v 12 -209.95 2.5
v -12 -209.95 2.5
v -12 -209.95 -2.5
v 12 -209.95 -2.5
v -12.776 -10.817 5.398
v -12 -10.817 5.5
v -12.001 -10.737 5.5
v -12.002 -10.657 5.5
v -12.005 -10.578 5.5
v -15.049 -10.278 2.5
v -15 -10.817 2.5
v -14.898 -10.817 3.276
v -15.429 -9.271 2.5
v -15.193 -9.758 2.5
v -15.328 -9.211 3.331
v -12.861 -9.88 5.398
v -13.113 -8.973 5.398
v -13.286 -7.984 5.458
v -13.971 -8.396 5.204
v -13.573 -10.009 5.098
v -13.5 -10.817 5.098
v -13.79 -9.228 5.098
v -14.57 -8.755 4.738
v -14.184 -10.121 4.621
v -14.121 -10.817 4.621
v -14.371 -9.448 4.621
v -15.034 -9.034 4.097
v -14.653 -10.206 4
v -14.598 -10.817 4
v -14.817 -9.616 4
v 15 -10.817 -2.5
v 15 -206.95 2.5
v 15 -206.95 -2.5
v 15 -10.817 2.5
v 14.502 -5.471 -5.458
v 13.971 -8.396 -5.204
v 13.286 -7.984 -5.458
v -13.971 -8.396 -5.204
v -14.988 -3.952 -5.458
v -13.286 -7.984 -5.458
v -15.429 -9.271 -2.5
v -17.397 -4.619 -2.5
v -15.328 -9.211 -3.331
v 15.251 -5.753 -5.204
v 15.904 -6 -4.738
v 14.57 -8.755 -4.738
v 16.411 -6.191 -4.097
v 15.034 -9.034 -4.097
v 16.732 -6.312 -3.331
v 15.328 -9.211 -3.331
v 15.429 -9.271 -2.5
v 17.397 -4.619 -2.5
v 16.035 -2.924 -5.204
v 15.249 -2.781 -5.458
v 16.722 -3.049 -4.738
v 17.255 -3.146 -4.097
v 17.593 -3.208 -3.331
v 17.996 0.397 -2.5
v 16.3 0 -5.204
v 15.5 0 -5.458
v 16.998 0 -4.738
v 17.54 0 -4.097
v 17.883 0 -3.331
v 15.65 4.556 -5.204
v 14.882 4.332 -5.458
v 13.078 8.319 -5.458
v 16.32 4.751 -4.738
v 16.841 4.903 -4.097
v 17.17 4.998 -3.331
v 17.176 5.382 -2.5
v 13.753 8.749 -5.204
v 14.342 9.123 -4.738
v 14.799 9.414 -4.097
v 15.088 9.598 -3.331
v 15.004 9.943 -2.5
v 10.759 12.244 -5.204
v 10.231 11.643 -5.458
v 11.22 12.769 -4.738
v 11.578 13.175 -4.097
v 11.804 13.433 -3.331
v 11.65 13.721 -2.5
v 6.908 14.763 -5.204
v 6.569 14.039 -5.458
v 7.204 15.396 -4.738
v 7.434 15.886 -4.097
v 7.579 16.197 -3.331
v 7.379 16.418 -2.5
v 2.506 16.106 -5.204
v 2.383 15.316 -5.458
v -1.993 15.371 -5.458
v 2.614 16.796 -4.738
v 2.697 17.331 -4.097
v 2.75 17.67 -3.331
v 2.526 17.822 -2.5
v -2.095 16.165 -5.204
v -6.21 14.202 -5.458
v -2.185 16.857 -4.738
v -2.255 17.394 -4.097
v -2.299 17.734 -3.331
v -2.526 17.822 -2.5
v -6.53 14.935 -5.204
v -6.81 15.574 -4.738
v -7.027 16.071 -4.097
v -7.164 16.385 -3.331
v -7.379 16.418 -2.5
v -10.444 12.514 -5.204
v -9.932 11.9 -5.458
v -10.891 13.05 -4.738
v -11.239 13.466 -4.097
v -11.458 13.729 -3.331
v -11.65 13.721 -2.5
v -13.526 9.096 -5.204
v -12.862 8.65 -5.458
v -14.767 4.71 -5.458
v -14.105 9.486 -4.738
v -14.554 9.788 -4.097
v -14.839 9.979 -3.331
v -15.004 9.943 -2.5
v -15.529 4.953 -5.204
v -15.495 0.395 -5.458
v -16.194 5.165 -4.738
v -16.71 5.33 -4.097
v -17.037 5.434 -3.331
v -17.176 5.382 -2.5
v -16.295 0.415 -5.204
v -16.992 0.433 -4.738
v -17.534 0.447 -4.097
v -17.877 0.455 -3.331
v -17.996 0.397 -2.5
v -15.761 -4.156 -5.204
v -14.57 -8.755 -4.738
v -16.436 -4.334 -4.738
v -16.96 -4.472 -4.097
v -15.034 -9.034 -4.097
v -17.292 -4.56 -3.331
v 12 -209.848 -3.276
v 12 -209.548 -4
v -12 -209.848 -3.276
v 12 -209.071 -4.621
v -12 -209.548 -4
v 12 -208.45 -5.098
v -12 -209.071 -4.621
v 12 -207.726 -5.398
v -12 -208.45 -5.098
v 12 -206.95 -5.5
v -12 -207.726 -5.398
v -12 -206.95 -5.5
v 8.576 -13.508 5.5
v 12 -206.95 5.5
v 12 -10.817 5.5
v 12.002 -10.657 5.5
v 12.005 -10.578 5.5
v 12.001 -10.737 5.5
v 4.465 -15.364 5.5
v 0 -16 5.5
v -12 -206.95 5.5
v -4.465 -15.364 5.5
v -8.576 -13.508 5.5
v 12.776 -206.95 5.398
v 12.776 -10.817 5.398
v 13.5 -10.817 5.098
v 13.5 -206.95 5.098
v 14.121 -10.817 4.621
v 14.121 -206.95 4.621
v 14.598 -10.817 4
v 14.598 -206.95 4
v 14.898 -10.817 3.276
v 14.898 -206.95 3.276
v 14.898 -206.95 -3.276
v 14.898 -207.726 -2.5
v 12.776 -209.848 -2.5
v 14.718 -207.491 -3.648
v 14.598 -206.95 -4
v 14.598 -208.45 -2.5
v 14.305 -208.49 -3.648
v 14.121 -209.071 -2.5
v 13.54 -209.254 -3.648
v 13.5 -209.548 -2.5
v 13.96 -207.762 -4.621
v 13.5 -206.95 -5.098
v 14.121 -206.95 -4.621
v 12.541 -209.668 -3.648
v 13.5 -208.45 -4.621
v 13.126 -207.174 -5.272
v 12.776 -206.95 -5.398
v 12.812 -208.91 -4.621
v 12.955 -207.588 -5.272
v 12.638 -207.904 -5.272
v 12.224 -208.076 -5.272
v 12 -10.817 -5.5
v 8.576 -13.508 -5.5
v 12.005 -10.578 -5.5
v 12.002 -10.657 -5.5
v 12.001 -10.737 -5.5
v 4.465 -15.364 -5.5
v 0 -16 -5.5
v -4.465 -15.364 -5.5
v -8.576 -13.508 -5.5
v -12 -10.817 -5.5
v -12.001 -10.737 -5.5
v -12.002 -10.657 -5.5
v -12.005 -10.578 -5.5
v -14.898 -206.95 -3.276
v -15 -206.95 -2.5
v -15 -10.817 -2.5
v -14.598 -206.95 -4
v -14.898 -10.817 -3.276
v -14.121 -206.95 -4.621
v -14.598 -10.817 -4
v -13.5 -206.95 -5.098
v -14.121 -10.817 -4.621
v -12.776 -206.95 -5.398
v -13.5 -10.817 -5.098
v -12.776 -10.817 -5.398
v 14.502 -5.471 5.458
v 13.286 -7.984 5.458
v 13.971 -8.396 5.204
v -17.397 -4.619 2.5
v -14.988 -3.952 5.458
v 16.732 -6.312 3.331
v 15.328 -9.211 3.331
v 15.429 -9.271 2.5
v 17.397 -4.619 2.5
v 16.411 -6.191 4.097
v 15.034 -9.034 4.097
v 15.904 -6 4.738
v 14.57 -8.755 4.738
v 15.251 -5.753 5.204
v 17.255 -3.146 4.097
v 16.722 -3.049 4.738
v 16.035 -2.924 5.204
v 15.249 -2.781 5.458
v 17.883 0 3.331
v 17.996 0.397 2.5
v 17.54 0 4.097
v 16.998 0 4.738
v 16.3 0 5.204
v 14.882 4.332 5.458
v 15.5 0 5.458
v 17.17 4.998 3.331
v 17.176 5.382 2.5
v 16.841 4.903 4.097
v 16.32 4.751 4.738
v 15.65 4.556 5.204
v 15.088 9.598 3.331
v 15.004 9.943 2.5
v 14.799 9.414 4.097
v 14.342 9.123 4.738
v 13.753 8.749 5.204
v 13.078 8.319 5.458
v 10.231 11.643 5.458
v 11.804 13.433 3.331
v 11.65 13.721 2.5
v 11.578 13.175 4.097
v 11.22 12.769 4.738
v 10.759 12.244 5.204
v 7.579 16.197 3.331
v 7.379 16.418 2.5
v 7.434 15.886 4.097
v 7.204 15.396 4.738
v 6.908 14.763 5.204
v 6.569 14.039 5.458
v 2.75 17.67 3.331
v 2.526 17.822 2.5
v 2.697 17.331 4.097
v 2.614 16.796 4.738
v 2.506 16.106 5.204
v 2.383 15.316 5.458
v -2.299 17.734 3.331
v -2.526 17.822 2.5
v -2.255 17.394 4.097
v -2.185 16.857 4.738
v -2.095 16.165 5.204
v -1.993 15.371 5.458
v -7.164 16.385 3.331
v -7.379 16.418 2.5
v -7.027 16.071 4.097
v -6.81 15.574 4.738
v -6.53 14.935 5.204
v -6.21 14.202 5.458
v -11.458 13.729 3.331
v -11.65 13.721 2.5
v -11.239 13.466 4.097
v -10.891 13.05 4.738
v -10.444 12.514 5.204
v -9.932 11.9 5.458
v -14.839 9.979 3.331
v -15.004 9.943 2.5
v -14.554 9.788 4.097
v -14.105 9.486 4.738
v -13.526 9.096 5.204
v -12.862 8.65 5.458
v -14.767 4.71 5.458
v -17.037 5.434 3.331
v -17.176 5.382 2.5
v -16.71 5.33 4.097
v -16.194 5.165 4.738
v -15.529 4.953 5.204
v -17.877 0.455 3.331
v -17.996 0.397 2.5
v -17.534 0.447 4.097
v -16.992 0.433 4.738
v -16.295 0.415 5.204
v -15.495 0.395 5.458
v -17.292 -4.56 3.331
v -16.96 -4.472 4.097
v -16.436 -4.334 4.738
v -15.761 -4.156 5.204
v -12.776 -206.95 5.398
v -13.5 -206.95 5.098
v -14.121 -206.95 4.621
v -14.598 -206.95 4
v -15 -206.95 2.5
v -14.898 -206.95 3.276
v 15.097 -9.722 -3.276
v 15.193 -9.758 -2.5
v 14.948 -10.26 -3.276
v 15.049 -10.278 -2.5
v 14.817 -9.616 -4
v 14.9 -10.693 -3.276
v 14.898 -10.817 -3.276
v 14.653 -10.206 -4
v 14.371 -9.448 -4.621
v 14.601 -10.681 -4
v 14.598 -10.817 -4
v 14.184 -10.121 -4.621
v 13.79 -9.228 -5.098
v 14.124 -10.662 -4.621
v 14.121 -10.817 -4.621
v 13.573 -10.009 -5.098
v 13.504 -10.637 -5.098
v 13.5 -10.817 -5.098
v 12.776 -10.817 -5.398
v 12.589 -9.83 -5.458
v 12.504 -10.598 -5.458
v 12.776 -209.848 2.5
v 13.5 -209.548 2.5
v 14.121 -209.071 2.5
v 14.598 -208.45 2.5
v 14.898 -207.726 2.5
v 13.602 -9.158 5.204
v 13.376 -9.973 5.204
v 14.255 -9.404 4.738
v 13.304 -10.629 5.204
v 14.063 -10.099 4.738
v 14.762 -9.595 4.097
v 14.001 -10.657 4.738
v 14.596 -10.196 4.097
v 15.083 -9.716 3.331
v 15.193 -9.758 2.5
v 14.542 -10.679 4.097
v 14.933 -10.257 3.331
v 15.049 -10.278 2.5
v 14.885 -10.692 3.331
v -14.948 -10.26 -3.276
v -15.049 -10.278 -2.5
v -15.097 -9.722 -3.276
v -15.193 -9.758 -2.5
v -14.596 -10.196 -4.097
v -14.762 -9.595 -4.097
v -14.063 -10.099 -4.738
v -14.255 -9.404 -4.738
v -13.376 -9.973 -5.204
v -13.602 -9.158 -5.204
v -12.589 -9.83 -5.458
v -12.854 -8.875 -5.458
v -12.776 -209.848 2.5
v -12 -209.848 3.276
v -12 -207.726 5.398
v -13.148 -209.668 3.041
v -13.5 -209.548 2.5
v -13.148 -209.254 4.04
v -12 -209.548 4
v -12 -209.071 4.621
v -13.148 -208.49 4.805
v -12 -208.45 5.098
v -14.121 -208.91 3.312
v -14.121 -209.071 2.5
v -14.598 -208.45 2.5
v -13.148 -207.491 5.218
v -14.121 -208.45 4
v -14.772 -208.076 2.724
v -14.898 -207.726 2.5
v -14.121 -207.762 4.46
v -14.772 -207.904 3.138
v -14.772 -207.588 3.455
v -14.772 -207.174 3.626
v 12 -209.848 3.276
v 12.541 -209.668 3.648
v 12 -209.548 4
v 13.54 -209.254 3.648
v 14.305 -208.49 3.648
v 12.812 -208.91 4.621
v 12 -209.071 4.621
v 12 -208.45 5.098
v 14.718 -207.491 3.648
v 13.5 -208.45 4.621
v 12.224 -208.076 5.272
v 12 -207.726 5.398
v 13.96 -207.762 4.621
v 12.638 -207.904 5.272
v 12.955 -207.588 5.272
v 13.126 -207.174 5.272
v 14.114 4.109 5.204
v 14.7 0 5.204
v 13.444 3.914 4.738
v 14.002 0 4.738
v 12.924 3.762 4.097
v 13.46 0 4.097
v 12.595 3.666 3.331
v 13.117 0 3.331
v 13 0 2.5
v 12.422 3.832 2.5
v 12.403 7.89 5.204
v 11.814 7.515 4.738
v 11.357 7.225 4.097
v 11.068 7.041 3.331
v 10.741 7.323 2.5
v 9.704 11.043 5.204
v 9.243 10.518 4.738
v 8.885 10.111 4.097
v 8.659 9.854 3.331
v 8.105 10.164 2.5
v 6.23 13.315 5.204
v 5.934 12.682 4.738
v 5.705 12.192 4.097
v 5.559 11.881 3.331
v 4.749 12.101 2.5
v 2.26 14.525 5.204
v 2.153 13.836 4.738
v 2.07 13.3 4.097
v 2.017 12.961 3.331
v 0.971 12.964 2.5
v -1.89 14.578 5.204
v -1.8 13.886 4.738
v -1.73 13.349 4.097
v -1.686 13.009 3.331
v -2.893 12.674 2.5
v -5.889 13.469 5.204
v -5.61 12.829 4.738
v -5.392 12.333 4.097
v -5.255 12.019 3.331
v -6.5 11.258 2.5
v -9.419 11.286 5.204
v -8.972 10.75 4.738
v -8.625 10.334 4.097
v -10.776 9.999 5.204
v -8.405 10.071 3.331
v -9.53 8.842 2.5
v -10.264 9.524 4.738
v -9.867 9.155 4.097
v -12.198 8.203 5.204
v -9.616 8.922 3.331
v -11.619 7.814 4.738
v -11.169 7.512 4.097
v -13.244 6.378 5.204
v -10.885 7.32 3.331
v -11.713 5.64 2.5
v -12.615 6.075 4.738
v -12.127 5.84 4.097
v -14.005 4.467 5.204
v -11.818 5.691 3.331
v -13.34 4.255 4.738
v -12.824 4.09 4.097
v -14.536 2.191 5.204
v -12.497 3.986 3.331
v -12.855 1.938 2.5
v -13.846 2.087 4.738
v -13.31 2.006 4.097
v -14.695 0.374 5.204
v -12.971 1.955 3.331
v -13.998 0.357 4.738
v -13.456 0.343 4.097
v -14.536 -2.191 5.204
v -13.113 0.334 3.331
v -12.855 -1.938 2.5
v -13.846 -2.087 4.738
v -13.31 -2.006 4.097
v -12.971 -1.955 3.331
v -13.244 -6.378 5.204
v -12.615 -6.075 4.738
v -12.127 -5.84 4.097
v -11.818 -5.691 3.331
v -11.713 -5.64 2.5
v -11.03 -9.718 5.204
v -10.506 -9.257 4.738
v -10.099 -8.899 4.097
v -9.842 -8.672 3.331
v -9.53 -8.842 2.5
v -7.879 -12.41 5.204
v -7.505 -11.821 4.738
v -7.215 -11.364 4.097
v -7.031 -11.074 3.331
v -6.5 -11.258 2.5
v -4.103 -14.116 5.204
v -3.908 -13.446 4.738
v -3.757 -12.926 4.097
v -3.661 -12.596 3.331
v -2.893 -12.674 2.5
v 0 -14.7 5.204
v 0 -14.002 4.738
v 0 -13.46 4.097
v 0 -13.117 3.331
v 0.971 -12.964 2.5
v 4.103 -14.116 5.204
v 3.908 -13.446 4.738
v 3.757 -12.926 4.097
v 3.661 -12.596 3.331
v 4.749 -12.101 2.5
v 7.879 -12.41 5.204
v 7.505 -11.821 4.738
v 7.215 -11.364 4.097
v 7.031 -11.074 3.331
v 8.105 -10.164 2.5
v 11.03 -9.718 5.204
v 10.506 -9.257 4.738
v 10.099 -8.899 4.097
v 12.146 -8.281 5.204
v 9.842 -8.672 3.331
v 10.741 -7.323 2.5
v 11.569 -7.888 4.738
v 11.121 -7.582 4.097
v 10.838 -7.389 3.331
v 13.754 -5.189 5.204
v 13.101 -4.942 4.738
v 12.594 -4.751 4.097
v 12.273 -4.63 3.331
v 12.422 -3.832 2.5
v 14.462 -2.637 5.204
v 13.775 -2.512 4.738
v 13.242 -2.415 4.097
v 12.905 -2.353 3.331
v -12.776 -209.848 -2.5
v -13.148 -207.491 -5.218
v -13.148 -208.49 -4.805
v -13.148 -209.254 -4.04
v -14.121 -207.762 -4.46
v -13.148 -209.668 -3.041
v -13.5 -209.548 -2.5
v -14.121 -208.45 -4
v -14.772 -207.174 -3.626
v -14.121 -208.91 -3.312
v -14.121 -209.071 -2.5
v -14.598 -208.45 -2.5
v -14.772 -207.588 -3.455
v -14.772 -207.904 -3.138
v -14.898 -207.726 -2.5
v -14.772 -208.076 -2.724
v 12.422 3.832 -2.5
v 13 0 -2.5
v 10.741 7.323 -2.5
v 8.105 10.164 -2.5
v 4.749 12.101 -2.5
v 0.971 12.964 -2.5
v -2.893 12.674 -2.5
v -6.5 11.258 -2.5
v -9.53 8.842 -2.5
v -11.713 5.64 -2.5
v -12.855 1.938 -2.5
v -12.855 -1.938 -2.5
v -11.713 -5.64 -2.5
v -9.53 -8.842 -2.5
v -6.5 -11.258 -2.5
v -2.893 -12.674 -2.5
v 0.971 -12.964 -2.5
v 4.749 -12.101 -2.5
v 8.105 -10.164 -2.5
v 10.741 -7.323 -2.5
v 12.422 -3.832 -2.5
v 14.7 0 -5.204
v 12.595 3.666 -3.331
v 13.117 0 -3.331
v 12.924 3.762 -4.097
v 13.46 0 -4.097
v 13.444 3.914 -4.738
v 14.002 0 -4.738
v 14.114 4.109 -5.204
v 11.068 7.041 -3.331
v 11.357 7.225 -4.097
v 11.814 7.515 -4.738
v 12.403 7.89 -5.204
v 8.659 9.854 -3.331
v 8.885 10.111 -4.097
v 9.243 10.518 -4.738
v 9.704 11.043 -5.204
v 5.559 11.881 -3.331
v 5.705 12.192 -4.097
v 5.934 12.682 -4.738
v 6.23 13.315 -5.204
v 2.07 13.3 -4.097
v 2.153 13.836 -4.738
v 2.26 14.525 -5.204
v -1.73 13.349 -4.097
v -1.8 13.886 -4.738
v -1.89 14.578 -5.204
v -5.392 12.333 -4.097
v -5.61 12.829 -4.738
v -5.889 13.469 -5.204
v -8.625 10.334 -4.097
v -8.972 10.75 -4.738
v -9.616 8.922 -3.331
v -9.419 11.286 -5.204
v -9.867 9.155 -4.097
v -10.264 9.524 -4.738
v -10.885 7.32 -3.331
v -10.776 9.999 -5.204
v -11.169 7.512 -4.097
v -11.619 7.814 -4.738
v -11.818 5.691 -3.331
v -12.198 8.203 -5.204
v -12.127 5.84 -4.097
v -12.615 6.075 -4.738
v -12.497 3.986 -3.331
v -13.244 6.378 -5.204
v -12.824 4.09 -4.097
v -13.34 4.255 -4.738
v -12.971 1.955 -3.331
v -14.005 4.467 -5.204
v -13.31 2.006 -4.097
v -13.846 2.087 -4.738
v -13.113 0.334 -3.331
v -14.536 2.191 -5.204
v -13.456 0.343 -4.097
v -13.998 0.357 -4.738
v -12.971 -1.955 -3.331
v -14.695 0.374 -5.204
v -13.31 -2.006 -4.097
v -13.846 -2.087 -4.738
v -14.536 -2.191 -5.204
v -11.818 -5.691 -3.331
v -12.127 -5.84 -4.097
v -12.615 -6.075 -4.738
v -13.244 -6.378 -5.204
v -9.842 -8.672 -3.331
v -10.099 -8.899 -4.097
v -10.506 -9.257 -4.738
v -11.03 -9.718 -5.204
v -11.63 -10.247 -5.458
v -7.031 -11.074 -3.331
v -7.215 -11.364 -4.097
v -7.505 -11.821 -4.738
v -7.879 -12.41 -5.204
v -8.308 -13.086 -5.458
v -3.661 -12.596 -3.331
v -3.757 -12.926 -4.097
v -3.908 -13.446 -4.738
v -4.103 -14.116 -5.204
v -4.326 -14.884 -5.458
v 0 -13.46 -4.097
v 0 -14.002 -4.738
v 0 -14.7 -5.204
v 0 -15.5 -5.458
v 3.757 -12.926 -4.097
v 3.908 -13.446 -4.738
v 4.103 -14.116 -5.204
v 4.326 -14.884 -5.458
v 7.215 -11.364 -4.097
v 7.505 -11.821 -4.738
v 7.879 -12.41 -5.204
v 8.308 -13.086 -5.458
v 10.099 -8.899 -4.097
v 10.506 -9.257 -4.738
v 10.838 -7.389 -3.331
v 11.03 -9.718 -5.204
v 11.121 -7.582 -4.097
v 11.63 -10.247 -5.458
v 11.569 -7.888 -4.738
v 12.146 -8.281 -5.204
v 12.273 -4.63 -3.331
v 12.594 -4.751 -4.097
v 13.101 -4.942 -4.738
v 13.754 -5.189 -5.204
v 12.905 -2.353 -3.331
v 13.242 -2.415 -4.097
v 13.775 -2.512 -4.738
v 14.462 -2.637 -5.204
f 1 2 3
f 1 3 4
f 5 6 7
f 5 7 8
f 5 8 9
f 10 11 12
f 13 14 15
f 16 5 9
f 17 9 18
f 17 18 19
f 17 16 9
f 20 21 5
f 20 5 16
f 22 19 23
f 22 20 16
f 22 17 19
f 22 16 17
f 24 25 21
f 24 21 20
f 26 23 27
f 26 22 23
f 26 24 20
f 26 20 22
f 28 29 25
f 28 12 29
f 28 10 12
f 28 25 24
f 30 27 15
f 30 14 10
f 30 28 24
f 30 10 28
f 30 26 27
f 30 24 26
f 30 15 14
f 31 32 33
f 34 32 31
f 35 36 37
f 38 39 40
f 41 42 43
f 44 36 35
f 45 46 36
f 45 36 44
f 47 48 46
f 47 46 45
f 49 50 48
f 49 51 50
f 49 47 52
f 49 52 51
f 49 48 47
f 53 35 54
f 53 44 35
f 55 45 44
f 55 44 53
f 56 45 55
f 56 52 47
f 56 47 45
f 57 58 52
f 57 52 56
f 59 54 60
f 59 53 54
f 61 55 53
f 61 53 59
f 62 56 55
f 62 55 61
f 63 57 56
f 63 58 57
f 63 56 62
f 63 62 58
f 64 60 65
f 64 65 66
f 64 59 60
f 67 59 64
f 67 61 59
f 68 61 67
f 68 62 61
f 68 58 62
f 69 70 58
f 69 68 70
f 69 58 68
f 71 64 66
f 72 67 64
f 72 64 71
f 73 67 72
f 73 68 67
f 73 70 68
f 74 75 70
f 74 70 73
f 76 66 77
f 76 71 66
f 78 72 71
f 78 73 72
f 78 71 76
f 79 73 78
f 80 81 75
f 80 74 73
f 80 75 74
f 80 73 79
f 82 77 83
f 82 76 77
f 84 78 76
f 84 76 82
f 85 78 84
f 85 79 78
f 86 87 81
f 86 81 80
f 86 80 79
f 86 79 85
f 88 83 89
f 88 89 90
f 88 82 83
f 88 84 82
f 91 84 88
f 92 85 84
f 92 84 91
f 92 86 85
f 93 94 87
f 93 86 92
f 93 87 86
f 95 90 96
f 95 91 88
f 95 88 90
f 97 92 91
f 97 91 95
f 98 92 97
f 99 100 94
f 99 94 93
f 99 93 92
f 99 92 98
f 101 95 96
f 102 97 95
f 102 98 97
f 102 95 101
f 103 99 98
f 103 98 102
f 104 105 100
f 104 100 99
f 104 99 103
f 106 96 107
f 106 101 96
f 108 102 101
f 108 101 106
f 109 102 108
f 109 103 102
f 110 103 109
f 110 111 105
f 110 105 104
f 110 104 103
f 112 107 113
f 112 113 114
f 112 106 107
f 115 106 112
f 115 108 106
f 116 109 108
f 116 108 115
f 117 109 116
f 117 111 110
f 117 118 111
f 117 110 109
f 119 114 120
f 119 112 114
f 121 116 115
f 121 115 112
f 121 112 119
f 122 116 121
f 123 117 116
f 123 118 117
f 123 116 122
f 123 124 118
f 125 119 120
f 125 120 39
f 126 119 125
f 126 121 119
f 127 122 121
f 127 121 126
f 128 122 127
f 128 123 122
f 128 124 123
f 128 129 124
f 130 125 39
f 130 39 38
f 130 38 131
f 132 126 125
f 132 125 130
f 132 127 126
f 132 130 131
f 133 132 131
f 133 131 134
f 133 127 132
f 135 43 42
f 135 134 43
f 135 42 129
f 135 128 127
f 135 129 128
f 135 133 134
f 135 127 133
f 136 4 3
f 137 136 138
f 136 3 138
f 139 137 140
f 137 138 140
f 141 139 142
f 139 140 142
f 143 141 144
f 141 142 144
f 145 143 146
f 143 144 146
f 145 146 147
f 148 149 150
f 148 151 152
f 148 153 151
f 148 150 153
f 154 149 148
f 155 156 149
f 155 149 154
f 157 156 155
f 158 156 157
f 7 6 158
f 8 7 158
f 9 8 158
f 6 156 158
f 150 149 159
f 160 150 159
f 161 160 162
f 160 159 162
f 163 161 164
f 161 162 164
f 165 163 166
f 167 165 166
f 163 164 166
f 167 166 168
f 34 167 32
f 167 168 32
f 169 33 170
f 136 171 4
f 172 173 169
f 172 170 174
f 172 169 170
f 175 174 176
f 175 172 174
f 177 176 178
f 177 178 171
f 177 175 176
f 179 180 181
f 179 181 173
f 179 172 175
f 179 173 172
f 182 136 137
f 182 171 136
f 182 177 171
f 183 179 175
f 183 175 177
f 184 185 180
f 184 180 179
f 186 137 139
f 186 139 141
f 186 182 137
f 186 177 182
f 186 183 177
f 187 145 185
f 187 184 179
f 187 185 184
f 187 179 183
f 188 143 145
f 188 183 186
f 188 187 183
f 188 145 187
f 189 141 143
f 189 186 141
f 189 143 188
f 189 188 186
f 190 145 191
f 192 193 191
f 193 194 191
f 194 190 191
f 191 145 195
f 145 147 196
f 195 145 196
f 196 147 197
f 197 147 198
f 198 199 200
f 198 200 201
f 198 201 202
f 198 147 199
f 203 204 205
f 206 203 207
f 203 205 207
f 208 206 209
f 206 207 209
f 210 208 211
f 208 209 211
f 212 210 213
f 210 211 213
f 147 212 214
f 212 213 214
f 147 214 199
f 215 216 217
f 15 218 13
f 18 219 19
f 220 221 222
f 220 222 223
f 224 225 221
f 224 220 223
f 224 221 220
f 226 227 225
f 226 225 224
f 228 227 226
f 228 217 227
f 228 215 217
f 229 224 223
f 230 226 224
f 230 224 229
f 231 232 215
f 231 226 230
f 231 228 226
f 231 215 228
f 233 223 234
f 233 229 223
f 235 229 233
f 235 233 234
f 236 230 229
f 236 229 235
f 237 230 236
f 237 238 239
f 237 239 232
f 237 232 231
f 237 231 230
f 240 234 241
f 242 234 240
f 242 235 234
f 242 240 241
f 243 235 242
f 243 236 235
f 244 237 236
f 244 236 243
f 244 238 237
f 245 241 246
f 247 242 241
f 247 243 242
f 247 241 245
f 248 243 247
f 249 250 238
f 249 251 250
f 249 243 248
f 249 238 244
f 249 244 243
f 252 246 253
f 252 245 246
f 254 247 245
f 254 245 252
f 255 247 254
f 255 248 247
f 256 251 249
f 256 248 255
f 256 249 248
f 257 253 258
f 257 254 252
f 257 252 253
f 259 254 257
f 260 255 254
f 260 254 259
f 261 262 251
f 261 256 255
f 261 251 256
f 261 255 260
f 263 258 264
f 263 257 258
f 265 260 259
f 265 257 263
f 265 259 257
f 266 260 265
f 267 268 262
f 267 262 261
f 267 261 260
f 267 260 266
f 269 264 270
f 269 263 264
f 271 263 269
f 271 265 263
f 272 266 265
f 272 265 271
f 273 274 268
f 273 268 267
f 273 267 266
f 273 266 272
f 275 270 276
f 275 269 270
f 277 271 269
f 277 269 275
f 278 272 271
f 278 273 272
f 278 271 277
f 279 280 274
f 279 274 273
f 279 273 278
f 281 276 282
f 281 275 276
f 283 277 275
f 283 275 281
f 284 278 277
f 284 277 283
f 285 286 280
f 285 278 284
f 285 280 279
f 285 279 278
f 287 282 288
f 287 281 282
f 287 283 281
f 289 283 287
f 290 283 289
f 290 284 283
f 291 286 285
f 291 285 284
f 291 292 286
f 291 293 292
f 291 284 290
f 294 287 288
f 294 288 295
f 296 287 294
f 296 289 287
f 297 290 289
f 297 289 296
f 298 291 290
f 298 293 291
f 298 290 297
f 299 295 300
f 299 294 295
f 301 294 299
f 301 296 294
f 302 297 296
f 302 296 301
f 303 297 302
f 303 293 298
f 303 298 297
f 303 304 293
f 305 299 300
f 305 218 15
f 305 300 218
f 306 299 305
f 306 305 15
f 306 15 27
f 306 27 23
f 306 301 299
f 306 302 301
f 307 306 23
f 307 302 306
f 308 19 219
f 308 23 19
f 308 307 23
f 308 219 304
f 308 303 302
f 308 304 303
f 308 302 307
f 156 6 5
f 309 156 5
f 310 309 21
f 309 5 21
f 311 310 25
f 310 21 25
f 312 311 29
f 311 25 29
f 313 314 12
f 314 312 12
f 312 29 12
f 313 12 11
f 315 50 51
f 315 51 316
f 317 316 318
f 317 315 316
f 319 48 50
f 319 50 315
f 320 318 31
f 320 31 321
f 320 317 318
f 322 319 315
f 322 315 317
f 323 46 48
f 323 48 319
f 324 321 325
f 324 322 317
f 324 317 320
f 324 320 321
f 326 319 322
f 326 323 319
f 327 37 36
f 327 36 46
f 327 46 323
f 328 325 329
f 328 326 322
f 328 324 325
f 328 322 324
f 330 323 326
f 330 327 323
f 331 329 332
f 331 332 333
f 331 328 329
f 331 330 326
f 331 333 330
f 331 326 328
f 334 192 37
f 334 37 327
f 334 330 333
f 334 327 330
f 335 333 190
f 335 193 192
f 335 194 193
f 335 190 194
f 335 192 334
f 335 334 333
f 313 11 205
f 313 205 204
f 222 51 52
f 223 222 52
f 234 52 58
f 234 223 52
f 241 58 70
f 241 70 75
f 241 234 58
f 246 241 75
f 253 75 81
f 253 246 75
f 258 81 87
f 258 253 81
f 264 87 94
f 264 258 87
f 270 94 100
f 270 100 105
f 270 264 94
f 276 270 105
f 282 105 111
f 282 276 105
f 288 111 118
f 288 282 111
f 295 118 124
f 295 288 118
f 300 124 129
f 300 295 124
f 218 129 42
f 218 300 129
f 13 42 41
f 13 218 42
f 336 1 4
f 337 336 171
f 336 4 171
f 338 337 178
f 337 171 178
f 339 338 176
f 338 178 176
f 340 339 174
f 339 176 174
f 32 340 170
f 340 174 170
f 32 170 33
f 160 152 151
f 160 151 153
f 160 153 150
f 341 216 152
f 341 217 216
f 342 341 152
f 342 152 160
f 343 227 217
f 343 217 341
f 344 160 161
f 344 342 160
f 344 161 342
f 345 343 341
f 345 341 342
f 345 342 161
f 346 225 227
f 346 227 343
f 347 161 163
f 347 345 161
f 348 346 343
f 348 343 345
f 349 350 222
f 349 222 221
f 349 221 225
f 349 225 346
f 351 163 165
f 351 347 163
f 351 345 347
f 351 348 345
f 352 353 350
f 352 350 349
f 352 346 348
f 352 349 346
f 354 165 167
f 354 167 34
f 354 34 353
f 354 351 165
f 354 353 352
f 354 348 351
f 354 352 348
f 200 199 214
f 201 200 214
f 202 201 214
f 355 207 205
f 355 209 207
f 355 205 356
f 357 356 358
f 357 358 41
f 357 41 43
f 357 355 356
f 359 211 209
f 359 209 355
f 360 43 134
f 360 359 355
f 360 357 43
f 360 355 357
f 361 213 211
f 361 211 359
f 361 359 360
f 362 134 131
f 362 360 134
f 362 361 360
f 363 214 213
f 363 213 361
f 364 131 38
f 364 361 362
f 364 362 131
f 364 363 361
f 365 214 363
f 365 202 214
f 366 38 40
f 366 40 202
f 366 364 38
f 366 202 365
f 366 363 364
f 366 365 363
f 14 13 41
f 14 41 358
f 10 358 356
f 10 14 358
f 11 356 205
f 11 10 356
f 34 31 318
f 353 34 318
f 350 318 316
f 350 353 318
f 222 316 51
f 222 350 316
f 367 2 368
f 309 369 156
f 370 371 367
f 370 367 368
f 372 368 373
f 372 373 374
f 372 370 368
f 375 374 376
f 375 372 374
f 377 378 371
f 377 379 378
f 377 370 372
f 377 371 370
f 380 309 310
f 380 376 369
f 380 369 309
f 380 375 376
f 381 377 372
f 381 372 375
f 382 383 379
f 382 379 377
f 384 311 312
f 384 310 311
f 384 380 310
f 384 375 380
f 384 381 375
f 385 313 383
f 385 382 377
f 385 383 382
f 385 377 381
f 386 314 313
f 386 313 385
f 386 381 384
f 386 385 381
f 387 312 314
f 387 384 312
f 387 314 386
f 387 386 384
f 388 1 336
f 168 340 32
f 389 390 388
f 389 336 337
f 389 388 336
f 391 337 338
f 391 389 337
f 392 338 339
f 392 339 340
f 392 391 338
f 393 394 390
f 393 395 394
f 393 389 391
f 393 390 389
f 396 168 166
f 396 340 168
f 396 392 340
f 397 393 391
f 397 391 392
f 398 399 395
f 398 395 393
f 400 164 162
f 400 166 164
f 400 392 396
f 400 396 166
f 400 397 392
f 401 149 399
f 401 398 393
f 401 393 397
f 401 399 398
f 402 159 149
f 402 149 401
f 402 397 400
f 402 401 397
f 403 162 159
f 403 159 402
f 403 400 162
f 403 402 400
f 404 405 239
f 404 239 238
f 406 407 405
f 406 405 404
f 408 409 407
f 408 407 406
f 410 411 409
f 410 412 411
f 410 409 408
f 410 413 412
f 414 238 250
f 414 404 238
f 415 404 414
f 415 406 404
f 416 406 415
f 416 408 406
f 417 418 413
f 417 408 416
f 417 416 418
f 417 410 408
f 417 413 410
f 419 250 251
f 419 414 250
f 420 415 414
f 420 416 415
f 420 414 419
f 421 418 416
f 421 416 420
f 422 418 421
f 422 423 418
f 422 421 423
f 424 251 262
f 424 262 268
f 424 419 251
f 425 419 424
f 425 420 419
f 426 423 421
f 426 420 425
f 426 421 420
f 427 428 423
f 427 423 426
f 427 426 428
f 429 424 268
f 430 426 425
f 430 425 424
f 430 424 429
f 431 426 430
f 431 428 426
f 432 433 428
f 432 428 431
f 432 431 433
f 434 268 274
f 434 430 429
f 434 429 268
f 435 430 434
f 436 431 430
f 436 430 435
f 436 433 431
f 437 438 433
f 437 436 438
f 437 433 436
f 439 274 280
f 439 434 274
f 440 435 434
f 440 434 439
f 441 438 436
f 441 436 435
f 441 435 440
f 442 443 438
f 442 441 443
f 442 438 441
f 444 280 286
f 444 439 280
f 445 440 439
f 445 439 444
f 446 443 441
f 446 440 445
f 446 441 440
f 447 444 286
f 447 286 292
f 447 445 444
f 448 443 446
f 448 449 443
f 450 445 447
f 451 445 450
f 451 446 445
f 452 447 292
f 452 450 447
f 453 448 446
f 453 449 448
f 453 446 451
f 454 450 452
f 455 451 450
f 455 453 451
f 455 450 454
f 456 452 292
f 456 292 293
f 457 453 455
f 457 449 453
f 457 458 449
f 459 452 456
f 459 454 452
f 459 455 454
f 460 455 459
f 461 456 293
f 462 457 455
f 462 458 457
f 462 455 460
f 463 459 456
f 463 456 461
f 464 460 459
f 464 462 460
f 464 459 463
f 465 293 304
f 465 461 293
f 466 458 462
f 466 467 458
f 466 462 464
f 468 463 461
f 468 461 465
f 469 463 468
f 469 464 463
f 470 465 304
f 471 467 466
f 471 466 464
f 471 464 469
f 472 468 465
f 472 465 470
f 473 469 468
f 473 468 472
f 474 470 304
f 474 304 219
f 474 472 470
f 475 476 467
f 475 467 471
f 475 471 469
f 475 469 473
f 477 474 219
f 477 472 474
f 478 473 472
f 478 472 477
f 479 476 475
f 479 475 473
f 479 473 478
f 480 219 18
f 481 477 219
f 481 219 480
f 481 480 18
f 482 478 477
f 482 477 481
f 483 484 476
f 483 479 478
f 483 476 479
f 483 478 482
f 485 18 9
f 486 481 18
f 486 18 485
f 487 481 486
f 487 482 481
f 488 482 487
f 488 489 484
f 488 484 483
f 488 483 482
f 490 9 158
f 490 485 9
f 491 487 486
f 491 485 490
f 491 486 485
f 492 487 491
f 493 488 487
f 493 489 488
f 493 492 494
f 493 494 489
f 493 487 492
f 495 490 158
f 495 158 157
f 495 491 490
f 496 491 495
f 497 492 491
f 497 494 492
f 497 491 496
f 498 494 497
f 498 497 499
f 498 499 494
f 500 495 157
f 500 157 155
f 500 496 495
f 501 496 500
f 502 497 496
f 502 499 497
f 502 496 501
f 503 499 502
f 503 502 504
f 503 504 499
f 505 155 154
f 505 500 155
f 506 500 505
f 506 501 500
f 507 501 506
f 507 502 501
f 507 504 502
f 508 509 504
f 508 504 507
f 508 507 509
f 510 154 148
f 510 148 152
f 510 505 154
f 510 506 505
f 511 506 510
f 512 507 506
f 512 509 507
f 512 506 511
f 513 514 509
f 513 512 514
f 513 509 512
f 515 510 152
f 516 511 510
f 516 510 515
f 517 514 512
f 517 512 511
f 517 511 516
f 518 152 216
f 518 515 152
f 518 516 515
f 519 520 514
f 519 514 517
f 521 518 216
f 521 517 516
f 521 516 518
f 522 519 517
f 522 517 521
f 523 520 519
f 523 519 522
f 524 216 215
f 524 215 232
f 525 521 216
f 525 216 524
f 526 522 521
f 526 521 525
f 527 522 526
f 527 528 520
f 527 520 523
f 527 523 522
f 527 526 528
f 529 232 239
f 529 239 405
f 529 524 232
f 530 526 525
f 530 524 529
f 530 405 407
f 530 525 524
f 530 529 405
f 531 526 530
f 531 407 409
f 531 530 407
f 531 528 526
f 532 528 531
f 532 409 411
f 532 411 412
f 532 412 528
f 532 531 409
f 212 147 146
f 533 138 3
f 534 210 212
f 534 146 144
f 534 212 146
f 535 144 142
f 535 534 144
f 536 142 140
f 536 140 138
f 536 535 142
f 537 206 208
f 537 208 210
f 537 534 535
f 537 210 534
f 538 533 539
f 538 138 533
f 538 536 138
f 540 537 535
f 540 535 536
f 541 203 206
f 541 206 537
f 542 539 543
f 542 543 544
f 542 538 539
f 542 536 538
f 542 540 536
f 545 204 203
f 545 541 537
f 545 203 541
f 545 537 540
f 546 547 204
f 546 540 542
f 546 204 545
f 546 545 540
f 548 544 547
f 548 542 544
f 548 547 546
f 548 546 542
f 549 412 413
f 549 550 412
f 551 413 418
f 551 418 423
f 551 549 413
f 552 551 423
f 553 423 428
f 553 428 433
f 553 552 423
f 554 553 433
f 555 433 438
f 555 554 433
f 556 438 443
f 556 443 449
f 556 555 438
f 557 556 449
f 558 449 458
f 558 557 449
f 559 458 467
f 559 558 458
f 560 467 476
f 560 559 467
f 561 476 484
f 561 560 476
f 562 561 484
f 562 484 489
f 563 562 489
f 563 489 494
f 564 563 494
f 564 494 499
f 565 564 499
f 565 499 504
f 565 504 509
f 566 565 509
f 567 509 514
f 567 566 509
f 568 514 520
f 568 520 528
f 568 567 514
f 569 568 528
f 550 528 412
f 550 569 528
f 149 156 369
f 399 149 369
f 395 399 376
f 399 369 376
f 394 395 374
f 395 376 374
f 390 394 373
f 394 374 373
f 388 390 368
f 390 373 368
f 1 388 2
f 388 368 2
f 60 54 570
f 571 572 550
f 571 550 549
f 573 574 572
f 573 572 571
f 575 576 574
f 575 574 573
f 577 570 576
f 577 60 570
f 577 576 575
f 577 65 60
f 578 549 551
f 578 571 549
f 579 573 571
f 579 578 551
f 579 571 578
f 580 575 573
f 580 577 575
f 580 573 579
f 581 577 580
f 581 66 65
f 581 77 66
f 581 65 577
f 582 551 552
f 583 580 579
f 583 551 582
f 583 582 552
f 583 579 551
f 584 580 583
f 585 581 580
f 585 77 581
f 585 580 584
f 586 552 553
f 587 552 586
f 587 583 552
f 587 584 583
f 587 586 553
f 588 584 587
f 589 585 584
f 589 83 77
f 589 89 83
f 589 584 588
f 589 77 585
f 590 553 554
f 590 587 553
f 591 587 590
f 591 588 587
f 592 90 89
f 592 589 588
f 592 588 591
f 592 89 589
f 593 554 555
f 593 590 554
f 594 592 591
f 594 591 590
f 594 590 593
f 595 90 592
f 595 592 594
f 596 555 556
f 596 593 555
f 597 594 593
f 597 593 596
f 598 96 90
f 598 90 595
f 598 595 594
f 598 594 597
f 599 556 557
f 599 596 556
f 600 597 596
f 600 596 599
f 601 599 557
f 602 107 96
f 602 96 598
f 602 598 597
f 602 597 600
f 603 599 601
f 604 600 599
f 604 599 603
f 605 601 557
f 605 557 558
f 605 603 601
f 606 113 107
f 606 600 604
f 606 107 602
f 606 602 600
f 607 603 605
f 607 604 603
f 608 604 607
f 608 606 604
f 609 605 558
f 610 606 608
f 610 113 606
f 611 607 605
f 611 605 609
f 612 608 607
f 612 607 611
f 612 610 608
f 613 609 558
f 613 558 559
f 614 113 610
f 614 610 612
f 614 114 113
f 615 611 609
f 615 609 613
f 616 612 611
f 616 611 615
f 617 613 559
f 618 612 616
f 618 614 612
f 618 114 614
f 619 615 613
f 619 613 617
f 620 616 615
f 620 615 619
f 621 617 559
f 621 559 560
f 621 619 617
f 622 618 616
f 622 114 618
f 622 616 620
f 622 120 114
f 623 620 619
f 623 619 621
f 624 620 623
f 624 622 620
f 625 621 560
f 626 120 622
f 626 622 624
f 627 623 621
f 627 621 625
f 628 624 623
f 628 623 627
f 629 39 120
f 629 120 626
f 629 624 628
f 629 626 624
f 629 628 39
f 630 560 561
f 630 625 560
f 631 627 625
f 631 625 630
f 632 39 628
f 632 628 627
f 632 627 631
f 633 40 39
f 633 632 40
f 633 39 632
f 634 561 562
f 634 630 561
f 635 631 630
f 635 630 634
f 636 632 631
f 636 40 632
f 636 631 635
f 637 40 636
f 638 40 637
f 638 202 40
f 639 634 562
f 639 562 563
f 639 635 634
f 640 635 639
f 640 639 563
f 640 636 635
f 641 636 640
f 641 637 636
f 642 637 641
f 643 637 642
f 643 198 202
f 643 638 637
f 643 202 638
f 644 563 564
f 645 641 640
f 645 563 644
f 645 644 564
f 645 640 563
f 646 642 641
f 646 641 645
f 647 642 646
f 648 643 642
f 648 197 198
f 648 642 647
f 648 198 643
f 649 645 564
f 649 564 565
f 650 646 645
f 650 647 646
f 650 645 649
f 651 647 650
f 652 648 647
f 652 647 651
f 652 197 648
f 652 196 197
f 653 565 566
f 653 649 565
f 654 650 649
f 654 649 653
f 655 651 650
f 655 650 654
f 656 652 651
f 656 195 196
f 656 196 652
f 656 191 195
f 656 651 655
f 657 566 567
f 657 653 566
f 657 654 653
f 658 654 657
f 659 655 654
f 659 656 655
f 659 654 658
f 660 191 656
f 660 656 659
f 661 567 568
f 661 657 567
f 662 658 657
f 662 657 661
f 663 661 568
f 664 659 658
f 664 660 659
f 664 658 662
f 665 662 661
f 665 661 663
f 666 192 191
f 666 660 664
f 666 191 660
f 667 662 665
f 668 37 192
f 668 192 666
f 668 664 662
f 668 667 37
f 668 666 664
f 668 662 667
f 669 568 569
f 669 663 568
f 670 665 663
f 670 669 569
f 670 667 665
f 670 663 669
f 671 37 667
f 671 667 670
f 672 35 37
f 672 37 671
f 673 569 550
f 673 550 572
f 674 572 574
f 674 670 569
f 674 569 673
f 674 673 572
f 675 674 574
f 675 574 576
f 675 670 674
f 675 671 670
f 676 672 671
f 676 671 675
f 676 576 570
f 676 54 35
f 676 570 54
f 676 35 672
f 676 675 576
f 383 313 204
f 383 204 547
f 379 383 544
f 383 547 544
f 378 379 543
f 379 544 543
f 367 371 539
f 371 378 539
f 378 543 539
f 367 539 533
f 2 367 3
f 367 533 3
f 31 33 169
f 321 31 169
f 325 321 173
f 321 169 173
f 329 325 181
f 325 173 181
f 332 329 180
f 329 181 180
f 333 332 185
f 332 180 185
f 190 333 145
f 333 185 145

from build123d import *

# Parameters (mm, degrees)
SKETCH1_R           = 13
BOSS_EXTRUDE1_DEPTH = 5.5
FILLET2_R           = 3


with BuildPart() as part:
    # Sketch1 → Boss-Extrude1 (new, symmetric)
    with BuildSketch(Plane.XY):
        with BuildLine():
            Line((-15, -9.949874371), (-15, -209.949874371))
            Line((-15, -209.949874371), (15, -209.949874371))
            Line((15, -209.949874371), (15, -9.949874371))
            ThreePointArc((15, -9.949874371), (0, 18), (-15, -9.949874371))
        make_face()
        Circle(SKETCH1_R, mode=Mode.SUBTRACT)
    extrude(amount=BOSS_EXTRUDE1_DEPTH, both=True)

    # Fillet2
    # the kernel refuses this fillet: 3 mm, written as the material it adds along each edge
    with BuildSketch(Plane(origin=(15, -9.949874371, 5.5), x_dir=(0.5340574779916704, 0.8454481712093158, 0), z_dir=(0, 0, -1))) as fillet2_piece_1:
        with BuildLine():
            CenterArc((0.869355329, 2.999254564), FILLET2_R, 237.719985552, 31.002719134)
            Line((-0.732817105, 0.46291005), (0, 0))
            ThreePointArc((0, 0), (0.401240921, 0.004472619), (0.802481842, 0))
        make_face()
    extrude(amount=11)
    with BuildSketch(Plane(origin=(-15, -9.949874371, 5.5), x_dir=(0, -1, 0), z_dir=(0, 0, -1))) as fillet2_piece_2:
        with BuildLine():
            CenterArc((0.866779455, 3), FILLET2_R, 238.997280866, 31.002719134)
            ThreePointArc((-0.678456806, 0.428571429), (-0.336839767, 0.218067082), (0, 0))
            Line((0, 0), (0.866779455, 0))
        make_face()
    extrude(amount=11)
    # the kernel refuses this fillet: 3 mm, written as the material it takes off along each edge
    with BuildSketch(Plane(origin=(0, 0, -5.5), x_dir=(1, 0, 0), z_dir=(0, -1, 0))) as fillet2_2_piece_1:
        with BuildLine():
            CenterArc((13 + FILLET2_R, FILLET2_R), FILLET2_R, 180, 90)
            Line((13, FILLET2_R), (13, 0))
            Line((13, 0), (13 + FILLET2_R, 0))
        make_face()
    revolve(axis=Axis((0, 0, -5.5), (0, 0, 1)), mode=Mode.SUBTRACT)
    with BuildSketch(Plane(origin=(0, 0, 5.5), x_dir=(1, 0, 0), z_dir=(0, -1, 0))) as fillet2_2_piece_2:
        with BuildLine():
            CenterArc((13 + FILLET2_R, -FILLET2_R), FILLET2_R, 90, 90)
            Line((13, -FILLET2_R), (13, 0))
            Line((13, 0), (13 + FILLET2_R, 0))
        make_face()
    revolve(axis=Axis((0, 0, 5.5), (0, 0, 1)), mode=Mode.SUBTRACT)
    with BuildSketch(Plane(origin=(-22.5, -209.949874371, 5.5), x_dir=(0, 1, 0), z_dir=(1, 0, 0)), Plane(origin=(-22.5, -209.949874371, -5.5), x_dir=(0, 0, 1), z_dir=(1, 0, 0))) as fillet2_2_piece_3:
        with BuildLine():
            CenterArc((FILLET2_R, -FILLET2_R), FILLET2_R, 90, 90)
            Line((0, -FILLET2_R), (0, 0))
            Line((0, 0), (FILLET2_R, 0))
        make_face()
    extrude(amount=45, mode=Mode.SUBTRACT)
    with BuildSketch(Plane(origin=(15, -209.949874371, -13), x_dir=(-1, 0, 0), z_dir=(0, 0, 1)), Plane(origin=(-15, -209.949874371, -13), x_dir=(0, 1, 0), z_dir=(0, 0, 1))) as fillet2_2_piece_4:
        with BuildLine():
            CenterArc((FILLET2_R, -FILLET2_R), FILLET2_R, 90, 90)
            Line((0, -FILLET2_R), (0, 0))
            Line((0, 0), (FILLET2_R, 0))
        make_face()
    extrude(amount=26, mode=Mode.SUBTRACT)
    # the kernel refuses this fillet: 3 mm, written as the material it takes off along each edge
    with BuildSketch(Plane(origin=(-12, -206.949874371, 2.5), x_dir=(0, 0, 1), z_dir=(-1, 0, 0))) as fillet2_3_piece_1_section:
        Polygon((0, 0), (FILLET2_R, 0), (FILLET2_R, -FILLET2_R), (0, -FILLET2_R), align=None)
    fillet2_3_piece_1 = extrude(amount=FILLET2_R, mode=Mode.PRIVATE)
    fillet2_3_piece_1 = fillet2_3_piece_1 - Plane(origin=(-12, -206.949874371, 2.5), x_dir=(0, 0.7071067811865475, -0.7071067811865475), z_dir=(-1, 0, 0)) * Sphere(FILLET2_R, mode=Mode.PRIVATE)
    add(fillet2_3_piece_1, mode=Mode.SUBTRACT)
    with BuildSketch(Plane(origin=(-12, -206.949874371, -2.5), x_dir=(0, 0, -1), z_dir=(-1, 0, 0))) as fillet2_3_piece_2_section:
        Polygon((0, 0), (FILLET2_R, 0), (FILLET2_R, FILLET2_R), (0, FILLET2_R), align=None)
    fillet2_3_piece_2 = extrude(amount=FILLET2_R, mode=Mode.PRIVATE)
    fillet2_3_piece_2 = fillet2_3_piece_2 - Plane(origin=(-12, -206.949874371, -2.5), x_dir=(0, 0.7071067811865475, 0.7071067811865475), z_dir=(-1, 0, 0)) * Sphere(FILLET2_R, mode=Mode.PRIVATE)
    add(fillet2_3_piece_2, mode=Mode.SUBTRACT)
    with BuildSketch(Plane(origin=(12, -206.949874371, -2.5), x_dir=(1, 0, 0), z_dir=(0, 0, -1))) as fillet2_3_piece_3_section:
        Polygon((0, 0), (FILLET2_R, 0), (FILLET2_R, FILLET2_R), (0, FILLET2_R), align=None)
    fillet2_3_piece_3 = extrude(amount=FILLET2_R, mode=Mode.PRIVATE)
    fillet2_3_piece_3 = fillet2_3_piece_3 - Plane(origin=(12, -206.949874371, -2.5), x_dir=(-0.7071067811865475, 0.7071067811865475, 0), z_dir=(0, 0, -1)) * Sphere(FILLET2_R, mode=Mode.PRIVATE)
    add(fillet2_3_piece_3, mode=Mode.SUBTRACT)
    with BuildSketch(Plane(origin=(12, -206.949874371, 2.5), x_dir=(1, 0, 0), z_dir=(0, 0, 1))) as fillet2_3_piece_4_section:
        Polygon((0, 0), (FILLET2_R, 0), (FILLET2_R, -FILLET2_R), (0, -FILLET2_R), align=None)
    fillet2_3_piece_4 = extrude(amount=FILLET2_R, mode=Mode.PRIVATE)
    fillet2_3_piece_4 = fillet2_3_piece_4 - Plane(origin=(12, -206.949874371, 2.5), x_dir=(-0.7071067811865475, 0.7071067811865475, 0), z_dir=(0, 0, 1)) * Sphere(FILLET2_R, mode=Mode.PRIVATE)
    add(fillet2_3_piece_4, mode=Mode.SUBTRACT)
    with BuildSketch(Plane(origin=(15, -206.949874371, 5.5), x_dir=(-1, 0, 0), z_dir=(0, 1, 0)), Plane(origin=(-15, -10.816653826, -5.5), x_dir=(0, 0, 1), z_dir=(0, -1, 0))) as fillet2_3_piece_5:
        with BuildLine():
            CenterArc((FILLET2_R, -FILLET2_R), FILLET2_R, 90, 90)
            Line((0, -FILLET2_R), (0, 0))
            Line((0, 0), (FILLET2_R, 0))
        make_face()
    extrude(amount=196.133220545, mode=Mode.SUBTRACT)
    with BuildSketch(Plane(origin=(0, 0, 5.5), x_dir=(0.8571428571428582, -0.5150787536377108, 0), z_dir=(-0.5150787536377108, -0.8571428571428582, 0))) as fillet2_3_piece_6:
        with BuildLine():
            CenterArc((18 - FILLET2_R, -FILLET2_R), FILLET2_R, 0, 90)
            Line((18, -FILLET2_R), (18, 0))
            Line((18, 0), (18 - FILLET2_R, 0))
        make_face()
    revolve(axis=Axis((0, 0, 5.5), (0, 0, 1)), revolution_arc=242.005438268, mode=Mode.SUBTRACT)
    with BuildSketch(Plane(origin=(15, -206.949874371, -5.5), x_dir=(-1, 0, 0), z_dir=(0, 1, 0)), Plane(origin=(-15, -10.816653826, 5.5), x_dir=(0, 0, -1), z_dir=(0, -1, 0))) as fillet2_3_piece_7:
        with BuildLine():
            CenterArc((FILLET2_R, FILLET2_R), FILLET2_R, 180, 90)
            Line((0, FILLET2_R), (0, 0))
            Line((0, 0), (FILLET2_R, 0))
        make_face()
    extrude(amount=196.133220545, mode=Mode.SUBTRACT)
    with BuildSketch(Plane(origin=(0, 0, -5.5), x_dir=(0.8571428571428582, -0.5150787536377108, 0), z_dir=(-0.5150787536377108, -0.8571428571428582, 0))) as fillet2_3_piece_8:
        with BuildLine():
            CenterArc((18 - FILLET2_R, FILLET2_R), FILLET2_R, 270, 90)
            Line((18, FILLET2_R), (18, 0))
            Line((18, 0), (18 - FILLET2_R, 0))
        make_face()
    revolve(axis=Axis((0, 0, -5.5), (0, 0, 1)), revolution_arc=242.005438268, mode=Mode.SUBTRACT)
    with BuildSketch(Plane(origin=(-18, -10.816653826, 5.5), x_dir=(1, 0, 0), z_dir=(0, -1, 0))) as fillet2_3_piece_9:
        with BuildLine():
            CenterArc((3 + FILLET2_R, -FILLET2_R), FILLET2_R, 90, 90)
            Line((3, -FILLET2_R), (3, 0))
            Line((3, 0), (3 + FILLET2_R, 0))
        make_face()
    revolve(axis=Axis((-18, -10.816653826, 5.5), (0, 0, 1)), revolution_arc=31.002719134, mode=Mode.SUBTRACT)
    with BuildSketch(Plane(origin=(18, -10.816653826, -5.5), x_dir=(-0.8571428571428581, 0.5150787536377112, 0), z_dir=(0.5150787536377112, 0.8571428571428581, 0))) as fillet2_3_piece_10:
        with BuildLine():
            CenterArc((3 + FILLET2_R, FILLET2_R), FILLET2_R, 180, 90)
            Line((3, FILLET2_R), (3, 0))
            Line((3, 0), (3 + FILLET2_R, 0))
        make_face()
    revolve(axis=Axis((18, -10.816653826, -5.5), (0, 0, 1)), revolution_arc=31.002719134, mode=Mode.SUBTRACT)
    with BuildSketch(Plane(origin=(-18, -10.816653826, -5.5), x_dir=(1, 0, 0), z_dir=(0, -1, 0))) as fillet2_3_piece_11:
        with BuildLine():
            CenterArc((3 + FILLET2_R, FILLET2_R), FILLET2_R, 180, 90)
            Line((3, FILLET2_R), (3, 0))
            Line((3, 0), (3 + FILLET2_R, 0))
        make_face()
    revolve(axis=Axis((-18, -10.816653826, -5.5), (0, 0, 1)), revolution_arc=31.002719134, mode=Mode.SUBTRACT)
    with BuildSketch(Plane(origin=(18, -10.816653826, 5.5), x_dir=(-0.8571428571428581, 0.5150787536377112, 0), z_dir=(0.5150787536377112, 0.8571428571428581, 0))) as fillet2_3_piece_12:
        with BuildLine():
            CenterArc((3 + FILLET2_R, -FILLET2_R), FILLET2_R, 90, 90)
            Line((3, -FILLET2_R), (3, 0))
            Line((3, 0), (3 + FILLET2_R, 0))
        make_face()
    revolve(axis=Axis((18, -10.816653826, 5.5), (0, 0, 1)), revolution_arc=31.002719134, mode=Mode.SUBTRACT)


solid = part.part
